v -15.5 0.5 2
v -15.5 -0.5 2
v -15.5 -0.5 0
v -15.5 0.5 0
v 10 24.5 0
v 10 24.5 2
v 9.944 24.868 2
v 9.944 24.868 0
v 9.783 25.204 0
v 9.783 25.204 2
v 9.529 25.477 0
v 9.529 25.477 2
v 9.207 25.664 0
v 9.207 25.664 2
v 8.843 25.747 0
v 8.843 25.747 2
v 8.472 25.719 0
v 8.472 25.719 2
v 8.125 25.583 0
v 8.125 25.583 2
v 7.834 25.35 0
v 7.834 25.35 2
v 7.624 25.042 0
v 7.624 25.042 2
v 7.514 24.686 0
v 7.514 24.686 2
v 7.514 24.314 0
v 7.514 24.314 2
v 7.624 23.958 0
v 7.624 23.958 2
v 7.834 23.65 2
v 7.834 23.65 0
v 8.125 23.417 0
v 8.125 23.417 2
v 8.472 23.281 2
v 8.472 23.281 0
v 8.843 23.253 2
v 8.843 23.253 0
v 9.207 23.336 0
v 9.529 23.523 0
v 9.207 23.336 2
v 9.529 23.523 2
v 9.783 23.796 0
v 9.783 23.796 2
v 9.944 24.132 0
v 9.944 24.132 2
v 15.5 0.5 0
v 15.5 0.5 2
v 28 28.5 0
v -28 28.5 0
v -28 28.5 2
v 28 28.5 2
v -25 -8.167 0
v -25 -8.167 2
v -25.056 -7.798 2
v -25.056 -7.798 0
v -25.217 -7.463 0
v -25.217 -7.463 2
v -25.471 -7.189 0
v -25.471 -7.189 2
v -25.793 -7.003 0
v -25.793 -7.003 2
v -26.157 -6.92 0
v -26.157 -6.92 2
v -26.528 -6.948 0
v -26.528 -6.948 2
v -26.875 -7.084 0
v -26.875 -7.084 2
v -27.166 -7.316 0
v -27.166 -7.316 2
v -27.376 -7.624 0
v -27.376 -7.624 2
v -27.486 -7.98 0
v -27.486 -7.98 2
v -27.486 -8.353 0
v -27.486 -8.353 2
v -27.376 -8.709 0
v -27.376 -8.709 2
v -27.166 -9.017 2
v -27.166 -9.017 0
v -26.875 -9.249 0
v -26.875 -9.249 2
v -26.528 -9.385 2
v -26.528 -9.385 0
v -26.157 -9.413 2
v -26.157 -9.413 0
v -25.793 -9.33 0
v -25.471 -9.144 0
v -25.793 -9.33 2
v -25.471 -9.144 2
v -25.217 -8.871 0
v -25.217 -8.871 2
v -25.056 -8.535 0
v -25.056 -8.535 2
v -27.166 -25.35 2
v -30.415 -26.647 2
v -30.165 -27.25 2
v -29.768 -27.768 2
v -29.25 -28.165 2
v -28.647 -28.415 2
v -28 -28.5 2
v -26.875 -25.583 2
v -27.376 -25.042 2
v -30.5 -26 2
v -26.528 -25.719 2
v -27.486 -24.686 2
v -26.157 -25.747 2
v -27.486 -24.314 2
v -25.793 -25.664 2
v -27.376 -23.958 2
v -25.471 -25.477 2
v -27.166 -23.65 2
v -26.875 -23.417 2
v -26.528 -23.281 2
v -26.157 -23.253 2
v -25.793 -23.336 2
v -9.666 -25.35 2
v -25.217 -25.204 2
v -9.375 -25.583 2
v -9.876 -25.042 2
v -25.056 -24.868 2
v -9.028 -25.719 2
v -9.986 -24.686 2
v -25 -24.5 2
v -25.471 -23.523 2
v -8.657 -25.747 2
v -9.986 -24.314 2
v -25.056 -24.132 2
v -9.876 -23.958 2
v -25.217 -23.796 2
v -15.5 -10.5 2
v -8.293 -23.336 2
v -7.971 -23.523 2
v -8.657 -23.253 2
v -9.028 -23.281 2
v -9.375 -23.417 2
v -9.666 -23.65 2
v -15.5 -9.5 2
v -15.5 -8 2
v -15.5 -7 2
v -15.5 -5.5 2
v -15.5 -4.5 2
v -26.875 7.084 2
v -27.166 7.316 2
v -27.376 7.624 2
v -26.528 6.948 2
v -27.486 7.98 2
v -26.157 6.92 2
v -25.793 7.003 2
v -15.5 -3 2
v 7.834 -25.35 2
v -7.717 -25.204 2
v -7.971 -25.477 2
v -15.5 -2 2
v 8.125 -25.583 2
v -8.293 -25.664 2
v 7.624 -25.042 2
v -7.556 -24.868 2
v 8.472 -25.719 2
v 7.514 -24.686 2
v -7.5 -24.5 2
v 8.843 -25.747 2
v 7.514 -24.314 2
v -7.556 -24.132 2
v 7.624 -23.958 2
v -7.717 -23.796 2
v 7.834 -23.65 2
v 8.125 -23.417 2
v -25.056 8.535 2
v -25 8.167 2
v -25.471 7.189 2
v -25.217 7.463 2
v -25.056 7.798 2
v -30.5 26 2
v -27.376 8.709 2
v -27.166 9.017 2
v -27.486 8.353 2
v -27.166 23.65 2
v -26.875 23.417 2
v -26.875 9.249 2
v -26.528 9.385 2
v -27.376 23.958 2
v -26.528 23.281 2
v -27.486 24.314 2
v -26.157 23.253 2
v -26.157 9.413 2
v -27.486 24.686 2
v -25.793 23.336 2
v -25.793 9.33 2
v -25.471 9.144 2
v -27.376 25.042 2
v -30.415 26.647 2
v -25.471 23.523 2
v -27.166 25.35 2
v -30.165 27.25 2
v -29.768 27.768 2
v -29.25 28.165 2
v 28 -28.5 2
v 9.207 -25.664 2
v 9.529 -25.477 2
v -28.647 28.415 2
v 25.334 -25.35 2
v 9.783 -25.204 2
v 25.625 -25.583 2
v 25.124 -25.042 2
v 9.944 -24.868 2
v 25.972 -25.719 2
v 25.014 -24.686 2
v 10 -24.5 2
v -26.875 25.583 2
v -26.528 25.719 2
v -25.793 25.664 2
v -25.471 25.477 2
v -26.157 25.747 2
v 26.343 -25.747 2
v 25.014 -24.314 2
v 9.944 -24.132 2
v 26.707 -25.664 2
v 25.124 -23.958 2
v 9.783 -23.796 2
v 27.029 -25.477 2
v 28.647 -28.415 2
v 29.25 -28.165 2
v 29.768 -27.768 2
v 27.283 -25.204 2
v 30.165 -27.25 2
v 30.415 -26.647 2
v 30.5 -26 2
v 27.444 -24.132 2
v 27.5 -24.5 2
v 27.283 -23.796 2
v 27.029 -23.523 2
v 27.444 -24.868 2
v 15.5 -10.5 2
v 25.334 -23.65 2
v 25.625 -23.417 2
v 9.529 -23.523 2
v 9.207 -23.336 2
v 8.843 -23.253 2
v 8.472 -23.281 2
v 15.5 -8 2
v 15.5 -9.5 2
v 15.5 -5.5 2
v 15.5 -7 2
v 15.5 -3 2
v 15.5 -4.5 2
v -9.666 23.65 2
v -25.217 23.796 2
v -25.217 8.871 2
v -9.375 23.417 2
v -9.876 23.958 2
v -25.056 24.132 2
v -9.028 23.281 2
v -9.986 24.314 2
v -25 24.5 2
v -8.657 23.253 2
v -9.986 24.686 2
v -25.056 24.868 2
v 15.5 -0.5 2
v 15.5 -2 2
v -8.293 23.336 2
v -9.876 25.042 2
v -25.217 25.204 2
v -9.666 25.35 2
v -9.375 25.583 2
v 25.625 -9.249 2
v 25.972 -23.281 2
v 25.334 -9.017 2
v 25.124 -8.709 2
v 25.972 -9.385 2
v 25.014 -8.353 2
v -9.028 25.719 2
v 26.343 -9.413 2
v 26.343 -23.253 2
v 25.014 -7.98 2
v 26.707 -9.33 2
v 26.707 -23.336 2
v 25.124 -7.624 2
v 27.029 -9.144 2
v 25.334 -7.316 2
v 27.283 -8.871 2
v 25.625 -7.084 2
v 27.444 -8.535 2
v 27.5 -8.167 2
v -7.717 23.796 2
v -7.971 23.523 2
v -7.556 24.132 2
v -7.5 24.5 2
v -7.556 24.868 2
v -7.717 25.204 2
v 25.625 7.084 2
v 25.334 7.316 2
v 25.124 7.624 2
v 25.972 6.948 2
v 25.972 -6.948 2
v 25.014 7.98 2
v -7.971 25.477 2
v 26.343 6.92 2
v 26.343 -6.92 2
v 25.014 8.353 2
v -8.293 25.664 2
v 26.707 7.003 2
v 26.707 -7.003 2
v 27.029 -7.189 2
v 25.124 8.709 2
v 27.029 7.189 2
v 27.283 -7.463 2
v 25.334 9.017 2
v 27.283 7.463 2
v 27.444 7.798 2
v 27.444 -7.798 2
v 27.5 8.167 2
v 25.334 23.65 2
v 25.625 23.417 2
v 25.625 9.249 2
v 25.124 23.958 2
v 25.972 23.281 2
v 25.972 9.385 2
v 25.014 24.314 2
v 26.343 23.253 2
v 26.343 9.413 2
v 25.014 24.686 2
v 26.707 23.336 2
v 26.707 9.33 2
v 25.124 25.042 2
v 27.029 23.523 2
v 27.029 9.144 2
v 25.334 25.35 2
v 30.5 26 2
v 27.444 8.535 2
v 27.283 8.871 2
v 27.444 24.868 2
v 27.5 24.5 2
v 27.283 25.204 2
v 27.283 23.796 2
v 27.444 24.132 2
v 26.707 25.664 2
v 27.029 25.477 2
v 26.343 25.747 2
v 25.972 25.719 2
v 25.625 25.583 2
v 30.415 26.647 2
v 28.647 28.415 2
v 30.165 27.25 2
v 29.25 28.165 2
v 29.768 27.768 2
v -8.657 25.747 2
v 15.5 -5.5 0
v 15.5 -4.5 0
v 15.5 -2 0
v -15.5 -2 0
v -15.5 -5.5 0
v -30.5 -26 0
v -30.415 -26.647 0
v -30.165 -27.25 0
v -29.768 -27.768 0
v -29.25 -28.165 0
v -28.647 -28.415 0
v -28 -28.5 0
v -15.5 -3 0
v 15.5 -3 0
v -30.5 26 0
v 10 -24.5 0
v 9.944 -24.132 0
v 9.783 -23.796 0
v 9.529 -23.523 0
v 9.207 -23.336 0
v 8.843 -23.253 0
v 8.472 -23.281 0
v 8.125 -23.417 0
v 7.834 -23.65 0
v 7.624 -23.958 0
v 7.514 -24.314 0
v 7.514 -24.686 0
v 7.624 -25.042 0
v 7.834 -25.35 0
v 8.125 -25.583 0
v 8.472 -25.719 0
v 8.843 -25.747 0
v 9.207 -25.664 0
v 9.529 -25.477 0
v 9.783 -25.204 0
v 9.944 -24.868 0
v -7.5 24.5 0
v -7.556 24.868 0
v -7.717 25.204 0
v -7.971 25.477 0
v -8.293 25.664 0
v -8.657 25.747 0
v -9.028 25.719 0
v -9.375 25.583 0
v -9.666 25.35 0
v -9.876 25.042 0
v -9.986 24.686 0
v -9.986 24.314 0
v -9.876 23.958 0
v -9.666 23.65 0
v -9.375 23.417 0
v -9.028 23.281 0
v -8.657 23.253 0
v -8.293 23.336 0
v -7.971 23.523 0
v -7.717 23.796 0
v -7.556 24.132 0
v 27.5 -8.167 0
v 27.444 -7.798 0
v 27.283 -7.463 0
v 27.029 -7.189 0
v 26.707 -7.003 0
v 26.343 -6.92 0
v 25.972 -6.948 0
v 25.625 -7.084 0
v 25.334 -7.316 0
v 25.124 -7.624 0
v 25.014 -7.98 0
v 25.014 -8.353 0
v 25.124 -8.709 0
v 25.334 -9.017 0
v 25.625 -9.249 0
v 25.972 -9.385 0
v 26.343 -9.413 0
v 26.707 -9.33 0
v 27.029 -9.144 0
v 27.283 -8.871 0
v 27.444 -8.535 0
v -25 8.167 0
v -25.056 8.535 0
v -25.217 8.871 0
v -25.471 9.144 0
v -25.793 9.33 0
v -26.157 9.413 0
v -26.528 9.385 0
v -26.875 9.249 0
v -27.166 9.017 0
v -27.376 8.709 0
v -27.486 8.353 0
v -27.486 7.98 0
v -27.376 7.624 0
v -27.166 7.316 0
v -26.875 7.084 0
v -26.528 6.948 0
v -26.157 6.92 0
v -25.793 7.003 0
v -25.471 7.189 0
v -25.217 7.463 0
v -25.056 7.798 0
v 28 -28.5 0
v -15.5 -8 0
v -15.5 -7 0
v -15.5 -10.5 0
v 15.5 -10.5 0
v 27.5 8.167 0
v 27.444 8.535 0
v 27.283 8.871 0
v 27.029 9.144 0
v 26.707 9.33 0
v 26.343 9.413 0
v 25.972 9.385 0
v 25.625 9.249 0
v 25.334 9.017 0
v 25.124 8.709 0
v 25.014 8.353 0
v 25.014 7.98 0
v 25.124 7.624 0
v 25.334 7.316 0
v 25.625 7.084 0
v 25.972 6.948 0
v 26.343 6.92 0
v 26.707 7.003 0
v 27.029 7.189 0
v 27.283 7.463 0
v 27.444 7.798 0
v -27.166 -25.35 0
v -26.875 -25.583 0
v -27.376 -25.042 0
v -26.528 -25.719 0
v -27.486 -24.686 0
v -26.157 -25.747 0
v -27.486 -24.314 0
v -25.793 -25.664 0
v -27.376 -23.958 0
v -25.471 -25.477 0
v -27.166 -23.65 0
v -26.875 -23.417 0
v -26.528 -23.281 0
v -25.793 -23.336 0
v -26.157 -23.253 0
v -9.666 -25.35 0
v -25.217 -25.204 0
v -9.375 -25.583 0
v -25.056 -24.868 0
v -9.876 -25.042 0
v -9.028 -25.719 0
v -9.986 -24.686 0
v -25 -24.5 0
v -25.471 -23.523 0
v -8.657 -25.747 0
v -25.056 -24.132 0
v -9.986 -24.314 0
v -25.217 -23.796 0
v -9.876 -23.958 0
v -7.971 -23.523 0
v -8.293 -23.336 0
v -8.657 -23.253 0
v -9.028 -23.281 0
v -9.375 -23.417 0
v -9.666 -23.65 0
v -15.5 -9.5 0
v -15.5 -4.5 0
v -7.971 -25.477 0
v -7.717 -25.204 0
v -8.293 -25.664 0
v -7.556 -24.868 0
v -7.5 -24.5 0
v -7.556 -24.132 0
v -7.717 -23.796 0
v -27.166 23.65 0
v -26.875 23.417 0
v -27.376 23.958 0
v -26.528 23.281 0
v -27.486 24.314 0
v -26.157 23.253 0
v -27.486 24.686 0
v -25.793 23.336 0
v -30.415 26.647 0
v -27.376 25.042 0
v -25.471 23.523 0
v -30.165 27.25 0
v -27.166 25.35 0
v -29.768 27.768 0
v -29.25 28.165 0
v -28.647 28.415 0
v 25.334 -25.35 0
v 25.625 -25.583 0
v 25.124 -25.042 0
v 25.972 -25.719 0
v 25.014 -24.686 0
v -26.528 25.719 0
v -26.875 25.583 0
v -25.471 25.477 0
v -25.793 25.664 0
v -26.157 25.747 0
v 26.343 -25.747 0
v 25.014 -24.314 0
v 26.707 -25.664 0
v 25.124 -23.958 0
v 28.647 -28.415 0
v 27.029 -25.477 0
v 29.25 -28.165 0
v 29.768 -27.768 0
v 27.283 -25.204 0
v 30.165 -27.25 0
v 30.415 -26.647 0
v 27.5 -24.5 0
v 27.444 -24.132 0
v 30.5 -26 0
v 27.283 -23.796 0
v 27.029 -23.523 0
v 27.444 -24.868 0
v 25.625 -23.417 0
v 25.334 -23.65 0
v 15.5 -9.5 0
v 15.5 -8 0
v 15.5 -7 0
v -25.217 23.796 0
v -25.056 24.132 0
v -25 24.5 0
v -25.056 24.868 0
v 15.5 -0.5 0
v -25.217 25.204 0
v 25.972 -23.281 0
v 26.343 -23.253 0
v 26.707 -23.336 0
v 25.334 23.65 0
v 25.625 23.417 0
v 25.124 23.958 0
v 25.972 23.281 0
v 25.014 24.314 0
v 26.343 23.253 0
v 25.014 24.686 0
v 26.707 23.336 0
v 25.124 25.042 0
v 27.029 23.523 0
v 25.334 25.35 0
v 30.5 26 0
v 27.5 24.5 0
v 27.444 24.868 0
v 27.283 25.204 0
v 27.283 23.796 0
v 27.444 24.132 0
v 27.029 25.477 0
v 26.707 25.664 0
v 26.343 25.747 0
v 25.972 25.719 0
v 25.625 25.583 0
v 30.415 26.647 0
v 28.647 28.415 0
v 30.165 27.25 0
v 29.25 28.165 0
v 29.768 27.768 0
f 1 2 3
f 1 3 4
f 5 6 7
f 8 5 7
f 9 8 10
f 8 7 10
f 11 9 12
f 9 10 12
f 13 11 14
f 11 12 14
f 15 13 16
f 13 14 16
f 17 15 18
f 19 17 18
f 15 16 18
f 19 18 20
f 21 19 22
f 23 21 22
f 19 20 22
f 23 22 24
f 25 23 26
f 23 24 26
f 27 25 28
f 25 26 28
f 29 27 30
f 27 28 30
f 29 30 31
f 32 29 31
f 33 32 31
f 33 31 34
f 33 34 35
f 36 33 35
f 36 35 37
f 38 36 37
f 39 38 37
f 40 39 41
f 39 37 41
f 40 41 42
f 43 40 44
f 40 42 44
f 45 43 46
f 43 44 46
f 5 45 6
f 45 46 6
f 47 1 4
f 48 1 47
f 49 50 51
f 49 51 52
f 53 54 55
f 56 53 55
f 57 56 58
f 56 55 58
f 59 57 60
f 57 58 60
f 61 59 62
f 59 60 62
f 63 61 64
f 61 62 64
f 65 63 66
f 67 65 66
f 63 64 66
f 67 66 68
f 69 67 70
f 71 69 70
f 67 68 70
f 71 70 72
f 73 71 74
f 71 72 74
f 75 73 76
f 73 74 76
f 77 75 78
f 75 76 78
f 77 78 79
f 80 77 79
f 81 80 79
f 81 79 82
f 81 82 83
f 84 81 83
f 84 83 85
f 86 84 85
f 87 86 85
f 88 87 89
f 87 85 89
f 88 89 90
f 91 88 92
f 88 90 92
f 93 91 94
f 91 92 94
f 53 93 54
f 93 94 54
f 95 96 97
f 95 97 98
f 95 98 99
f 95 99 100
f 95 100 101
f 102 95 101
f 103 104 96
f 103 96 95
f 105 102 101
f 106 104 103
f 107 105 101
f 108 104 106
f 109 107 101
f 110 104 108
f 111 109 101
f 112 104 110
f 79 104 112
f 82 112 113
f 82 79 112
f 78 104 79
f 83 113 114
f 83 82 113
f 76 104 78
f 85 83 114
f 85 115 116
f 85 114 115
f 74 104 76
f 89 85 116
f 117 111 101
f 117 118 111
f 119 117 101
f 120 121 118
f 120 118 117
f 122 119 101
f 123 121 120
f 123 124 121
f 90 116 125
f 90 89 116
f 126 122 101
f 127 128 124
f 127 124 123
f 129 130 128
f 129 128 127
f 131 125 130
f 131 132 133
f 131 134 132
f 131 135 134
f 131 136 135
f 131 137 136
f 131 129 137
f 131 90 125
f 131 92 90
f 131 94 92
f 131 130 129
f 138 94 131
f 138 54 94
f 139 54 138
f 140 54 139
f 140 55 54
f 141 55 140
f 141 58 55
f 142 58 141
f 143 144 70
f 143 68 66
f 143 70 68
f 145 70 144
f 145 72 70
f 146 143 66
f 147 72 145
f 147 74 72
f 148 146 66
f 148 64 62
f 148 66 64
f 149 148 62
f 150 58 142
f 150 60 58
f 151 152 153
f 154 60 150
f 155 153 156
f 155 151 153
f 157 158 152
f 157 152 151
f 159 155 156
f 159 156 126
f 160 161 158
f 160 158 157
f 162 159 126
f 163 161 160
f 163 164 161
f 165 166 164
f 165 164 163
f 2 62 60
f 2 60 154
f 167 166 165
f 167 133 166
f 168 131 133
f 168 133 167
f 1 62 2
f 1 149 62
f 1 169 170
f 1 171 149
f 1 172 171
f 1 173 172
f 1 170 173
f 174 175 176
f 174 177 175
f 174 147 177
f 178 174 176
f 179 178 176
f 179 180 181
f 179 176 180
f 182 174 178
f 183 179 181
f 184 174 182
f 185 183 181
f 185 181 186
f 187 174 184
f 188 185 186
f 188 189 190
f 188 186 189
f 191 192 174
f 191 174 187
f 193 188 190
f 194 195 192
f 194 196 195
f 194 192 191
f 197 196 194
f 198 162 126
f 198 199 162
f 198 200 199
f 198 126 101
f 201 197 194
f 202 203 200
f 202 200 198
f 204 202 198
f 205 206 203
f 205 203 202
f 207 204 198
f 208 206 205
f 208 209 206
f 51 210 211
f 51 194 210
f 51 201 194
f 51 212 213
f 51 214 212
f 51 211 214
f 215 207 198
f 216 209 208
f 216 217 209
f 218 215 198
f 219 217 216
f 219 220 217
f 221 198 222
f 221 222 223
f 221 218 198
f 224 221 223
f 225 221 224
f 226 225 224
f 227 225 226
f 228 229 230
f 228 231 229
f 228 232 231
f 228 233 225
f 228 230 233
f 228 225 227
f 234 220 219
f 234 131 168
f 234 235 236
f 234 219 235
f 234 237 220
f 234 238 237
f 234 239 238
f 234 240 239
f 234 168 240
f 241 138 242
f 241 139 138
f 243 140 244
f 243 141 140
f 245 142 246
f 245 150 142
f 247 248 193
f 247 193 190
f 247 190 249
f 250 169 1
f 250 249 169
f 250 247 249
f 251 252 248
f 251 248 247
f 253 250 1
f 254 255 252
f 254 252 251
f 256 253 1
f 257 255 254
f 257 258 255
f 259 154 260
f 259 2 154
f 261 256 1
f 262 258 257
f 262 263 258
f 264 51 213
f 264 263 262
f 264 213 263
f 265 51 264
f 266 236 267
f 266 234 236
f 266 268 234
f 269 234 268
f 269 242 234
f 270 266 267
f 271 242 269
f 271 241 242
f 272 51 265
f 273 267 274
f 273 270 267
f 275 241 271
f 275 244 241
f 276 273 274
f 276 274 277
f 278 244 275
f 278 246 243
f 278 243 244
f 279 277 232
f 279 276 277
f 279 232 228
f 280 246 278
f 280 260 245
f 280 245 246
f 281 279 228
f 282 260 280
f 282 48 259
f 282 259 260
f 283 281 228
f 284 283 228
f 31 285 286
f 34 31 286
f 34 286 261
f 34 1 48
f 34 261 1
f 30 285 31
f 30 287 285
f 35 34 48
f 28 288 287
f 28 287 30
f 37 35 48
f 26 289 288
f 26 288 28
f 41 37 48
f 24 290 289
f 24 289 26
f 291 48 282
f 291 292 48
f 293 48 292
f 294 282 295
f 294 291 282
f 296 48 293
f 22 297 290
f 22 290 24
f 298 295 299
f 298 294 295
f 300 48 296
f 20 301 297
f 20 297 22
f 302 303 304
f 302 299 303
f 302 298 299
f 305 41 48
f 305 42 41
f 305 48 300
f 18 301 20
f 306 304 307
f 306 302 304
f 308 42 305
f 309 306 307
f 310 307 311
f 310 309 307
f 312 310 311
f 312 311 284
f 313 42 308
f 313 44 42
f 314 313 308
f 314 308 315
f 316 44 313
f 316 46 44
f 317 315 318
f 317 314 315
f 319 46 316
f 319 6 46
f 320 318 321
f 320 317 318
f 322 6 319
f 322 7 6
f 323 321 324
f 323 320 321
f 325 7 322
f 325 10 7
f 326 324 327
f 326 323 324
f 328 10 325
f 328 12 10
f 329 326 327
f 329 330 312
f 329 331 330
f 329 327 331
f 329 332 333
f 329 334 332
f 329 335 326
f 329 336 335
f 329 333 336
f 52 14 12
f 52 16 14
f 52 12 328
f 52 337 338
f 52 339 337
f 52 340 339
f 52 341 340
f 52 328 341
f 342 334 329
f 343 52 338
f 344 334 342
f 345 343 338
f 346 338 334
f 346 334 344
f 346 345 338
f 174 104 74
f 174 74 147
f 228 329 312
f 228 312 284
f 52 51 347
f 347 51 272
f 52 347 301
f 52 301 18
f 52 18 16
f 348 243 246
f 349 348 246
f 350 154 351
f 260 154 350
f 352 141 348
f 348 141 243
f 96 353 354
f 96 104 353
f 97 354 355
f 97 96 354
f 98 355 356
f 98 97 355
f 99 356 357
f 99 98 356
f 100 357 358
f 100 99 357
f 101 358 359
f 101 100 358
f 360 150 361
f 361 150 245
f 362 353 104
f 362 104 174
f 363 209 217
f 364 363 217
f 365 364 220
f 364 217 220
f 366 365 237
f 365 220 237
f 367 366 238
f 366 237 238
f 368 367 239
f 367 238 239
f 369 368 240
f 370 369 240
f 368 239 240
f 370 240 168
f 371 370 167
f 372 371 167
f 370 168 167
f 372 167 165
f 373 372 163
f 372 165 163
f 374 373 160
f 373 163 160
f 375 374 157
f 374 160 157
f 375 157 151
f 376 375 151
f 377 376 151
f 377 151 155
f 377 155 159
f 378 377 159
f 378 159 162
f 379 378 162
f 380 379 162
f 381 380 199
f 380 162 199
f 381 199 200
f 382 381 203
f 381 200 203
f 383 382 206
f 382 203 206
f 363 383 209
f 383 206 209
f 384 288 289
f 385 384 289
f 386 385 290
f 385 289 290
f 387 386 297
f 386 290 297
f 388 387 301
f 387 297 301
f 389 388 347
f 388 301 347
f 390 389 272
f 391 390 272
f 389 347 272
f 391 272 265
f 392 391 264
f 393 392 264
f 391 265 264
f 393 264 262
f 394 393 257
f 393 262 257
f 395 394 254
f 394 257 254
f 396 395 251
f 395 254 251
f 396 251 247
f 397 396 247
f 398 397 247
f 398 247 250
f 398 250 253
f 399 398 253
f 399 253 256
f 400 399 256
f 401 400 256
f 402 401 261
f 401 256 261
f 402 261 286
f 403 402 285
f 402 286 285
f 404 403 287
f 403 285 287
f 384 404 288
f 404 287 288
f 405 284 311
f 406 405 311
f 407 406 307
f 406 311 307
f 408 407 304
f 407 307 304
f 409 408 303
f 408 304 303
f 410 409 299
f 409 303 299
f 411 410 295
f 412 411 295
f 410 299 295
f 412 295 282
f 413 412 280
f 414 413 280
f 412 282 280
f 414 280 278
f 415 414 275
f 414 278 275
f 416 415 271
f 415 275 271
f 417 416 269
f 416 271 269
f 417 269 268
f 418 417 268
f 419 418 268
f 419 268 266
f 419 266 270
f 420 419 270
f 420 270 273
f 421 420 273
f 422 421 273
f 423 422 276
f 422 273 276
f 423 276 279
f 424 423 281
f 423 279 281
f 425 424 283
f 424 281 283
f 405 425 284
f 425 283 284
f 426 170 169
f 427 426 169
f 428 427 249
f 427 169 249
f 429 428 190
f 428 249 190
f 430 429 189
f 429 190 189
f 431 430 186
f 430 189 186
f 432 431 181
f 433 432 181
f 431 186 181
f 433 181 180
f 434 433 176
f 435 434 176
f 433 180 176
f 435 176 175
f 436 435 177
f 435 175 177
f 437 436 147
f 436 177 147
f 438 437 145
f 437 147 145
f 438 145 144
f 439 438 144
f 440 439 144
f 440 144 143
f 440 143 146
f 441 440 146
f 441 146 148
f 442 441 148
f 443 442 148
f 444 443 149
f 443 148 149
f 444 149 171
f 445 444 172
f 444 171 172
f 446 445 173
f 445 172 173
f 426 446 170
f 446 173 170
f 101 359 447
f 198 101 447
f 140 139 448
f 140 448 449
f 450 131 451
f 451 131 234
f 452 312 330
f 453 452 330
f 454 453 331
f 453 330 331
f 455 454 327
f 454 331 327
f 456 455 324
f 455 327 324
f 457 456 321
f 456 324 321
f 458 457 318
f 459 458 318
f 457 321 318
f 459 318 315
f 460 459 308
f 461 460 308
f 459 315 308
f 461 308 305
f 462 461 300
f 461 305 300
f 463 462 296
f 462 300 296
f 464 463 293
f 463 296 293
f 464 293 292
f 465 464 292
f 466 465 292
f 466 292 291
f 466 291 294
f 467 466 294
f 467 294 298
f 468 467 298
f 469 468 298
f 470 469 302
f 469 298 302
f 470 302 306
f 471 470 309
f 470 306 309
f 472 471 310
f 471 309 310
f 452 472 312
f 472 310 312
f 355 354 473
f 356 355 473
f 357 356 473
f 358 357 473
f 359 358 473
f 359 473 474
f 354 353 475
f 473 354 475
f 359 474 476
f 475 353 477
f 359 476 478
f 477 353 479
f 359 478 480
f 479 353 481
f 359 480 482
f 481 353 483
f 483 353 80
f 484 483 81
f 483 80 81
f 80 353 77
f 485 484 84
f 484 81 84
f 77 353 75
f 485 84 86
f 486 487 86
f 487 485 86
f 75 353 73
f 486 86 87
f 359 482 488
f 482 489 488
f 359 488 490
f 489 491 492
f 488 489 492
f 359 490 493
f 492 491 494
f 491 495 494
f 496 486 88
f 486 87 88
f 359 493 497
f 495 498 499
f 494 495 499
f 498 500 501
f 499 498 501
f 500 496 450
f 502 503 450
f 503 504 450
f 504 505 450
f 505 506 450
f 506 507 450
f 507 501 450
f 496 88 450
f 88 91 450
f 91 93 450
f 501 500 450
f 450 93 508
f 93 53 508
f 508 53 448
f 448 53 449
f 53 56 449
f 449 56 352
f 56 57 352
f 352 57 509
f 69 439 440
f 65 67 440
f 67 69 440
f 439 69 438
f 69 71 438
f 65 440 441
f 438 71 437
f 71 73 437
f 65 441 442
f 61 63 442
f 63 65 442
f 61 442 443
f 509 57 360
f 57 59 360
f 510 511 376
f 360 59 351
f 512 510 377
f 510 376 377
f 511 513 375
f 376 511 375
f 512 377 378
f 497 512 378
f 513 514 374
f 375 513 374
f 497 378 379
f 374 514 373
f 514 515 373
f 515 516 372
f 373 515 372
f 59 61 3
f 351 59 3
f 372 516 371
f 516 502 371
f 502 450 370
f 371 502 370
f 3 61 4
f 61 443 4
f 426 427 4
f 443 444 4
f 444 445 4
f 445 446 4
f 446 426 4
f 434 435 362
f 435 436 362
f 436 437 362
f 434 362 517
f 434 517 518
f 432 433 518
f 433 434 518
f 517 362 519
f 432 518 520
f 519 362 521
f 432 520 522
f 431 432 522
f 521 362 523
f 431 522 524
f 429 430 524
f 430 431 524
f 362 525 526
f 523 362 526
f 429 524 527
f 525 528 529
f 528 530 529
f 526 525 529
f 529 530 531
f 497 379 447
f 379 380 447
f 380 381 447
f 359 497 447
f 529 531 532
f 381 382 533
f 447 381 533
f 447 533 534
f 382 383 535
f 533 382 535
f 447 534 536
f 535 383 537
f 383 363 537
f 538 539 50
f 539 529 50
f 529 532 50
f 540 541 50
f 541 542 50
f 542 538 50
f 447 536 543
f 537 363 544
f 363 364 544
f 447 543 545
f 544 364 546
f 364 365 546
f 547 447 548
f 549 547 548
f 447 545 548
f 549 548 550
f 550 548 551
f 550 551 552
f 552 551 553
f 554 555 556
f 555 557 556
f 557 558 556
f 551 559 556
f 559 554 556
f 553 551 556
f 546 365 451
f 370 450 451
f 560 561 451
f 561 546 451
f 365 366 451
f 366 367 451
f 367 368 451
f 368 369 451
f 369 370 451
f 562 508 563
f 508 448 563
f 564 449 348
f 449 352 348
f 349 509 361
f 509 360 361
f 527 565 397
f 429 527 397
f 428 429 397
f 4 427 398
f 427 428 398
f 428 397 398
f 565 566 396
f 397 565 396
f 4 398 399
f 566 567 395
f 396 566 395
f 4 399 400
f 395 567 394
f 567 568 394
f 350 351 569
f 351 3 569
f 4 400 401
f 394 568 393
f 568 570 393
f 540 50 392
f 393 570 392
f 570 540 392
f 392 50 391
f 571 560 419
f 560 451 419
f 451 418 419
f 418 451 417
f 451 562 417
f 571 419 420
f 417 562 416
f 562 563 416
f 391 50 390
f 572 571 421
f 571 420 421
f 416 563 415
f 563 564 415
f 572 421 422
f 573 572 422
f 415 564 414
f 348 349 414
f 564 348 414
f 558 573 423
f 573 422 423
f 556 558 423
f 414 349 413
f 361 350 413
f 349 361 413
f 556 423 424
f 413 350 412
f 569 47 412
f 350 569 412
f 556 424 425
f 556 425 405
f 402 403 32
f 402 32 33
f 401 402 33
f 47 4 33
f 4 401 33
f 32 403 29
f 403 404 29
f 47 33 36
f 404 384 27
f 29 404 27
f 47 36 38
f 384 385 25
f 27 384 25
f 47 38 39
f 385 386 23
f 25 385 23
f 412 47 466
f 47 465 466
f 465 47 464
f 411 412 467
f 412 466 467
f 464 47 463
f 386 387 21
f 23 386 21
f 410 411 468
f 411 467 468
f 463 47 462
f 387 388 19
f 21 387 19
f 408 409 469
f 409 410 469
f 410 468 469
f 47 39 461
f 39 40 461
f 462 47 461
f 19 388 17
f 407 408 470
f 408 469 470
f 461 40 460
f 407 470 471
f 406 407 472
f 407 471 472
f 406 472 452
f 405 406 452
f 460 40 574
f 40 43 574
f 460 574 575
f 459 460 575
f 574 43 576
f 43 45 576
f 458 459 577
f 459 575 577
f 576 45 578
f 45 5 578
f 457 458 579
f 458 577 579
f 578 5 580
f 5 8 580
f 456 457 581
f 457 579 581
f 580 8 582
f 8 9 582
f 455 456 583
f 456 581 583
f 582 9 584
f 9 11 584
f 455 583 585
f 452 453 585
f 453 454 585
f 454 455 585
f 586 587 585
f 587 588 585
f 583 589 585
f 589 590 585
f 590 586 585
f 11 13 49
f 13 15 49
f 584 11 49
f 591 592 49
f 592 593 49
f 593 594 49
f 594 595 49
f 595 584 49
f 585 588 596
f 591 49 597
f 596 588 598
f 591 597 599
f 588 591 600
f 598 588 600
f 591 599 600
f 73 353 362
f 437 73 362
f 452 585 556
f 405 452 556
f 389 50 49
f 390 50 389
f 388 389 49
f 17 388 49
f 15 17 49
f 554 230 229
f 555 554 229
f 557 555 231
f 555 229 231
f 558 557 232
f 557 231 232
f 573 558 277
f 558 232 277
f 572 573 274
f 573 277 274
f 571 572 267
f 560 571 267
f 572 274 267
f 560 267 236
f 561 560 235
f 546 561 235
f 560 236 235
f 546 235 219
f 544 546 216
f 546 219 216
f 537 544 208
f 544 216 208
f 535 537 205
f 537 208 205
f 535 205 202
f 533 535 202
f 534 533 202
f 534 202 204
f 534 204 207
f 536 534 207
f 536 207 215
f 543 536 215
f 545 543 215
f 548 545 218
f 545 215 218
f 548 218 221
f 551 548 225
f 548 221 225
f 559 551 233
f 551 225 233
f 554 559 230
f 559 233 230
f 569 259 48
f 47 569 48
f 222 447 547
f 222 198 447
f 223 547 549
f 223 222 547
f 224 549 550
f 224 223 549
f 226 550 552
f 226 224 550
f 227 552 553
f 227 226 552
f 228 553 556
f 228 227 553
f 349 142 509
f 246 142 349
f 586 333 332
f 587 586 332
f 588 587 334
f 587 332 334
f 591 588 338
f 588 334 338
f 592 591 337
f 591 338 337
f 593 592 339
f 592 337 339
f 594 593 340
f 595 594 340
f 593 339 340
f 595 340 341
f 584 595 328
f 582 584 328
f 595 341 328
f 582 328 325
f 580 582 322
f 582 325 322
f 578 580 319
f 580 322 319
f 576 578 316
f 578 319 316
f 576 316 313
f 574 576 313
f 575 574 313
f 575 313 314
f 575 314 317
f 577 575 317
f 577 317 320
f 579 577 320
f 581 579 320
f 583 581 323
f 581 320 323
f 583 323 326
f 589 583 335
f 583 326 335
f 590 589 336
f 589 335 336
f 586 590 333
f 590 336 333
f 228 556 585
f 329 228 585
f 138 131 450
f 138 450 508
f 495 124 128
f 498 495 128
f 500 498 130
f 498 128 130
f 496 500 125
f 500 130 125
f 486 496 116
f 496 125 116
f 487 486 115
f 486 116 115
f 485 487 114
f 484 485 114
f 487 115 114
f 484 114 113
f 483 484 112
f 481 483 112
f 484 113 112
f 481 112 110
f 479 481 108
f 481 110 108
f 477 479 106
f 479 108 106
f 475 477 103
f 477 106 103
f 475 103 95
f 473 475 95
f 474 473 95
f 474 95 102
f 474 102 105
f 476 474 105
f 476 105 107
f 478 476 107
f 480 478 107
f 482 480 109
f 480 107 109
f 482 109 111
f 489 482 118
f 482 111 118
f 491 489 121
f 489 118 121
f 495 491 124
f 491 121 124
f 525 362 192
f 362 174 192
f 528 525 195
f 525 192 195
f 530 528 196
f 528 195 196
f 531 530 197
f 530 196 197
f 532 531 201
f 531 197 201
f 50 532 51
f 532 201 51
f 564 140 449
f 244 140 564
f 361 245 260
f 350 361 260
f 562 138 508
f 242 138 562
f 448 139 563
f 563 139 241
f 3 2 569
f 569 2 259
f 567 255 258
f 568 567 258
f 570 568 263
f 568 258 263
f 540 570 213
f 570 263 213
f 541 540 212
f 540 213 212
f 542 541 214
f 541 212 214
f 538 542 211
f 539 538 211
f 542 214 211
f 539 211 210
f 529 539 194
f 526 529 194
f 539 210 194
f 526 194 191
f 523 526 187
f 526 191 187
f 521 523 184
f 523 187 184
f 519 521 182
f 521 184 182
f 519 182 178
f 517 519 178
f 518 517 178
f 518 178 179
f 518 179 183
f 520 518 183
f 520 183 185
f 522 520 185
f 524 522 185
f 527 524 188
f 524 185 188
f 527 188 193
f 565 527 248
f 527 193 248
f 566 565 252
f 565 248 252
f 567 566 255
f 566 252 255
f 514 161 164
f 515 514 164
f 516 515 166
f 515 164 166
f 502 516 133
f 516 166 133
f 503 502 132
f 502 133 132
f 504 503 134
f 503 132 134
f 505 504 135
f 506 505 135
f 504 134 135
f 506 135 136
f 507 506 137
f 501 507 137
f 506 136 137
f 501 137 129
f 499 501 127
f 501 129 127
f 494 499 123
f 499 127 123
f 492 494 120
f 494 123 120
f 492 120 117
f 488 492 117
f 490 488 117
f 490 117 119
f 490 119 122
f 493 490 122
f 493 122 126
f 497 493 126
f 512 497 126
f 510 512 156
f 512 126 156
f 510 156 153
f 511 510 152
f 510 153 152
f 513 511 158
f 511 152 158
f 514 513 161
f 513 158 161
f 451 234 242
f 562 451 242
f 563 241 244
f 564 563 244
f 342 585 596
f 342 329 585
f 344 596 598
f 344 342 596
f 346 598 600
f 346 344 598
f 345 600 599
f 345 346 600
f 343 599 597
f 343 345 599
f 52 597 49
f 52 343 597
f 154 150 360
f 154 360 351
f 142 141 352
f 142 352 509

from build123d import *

# Parameters (mm, degrees)
SKETCH1_W           = 61
SKETCH1_H           = 57
BOSS_EXTRUDE1_DEPTH = 2
FILLET1_R           = 2.5
SKETCH2_R           = 1.25
CUT_EXTRUDE1_DEPTH  = 2
SKETCH3_W           = 31
SKETCH3_H           = 1
CUT_EXTRUDE2_DEPTH  = 2


with BuildPart() as part:
    # Sketch1 → Boss-Extrude1 (new body)
    with BuildSketch(Plane.XY):
        Rectangle(SKETCH1_W, SKETCH1_H)
    extrude(amount=BOSS_EXTRUDE1_DEPTH)

    # Fillet1
    fillet1_edges = [part.edges().sort_by_distance(p)[0] for p in [
        (30.5, -28.5, 1),
        (-30.5, -28.5, 1),
        (-30.5, 28.5, 1),
        (30.5, 28.5, 1),
    ]]
    fillet(fillet1_edges, radius=FILLET1_R)

    # Sketch2 → Cut-Extrude1 (cut)
    with BuildSketch(Plane.XY.offset(2)):
        with Locations((-26.25, 24.5)):
            Circle(SKETCH2_R)
        with Locations((-8.75, 24.5)):
            Circle(SKETCH2_R)
        with Locations((8.75, 24.5)):
            Circle(SKETCH2_R)
        with Locations((26.25, 24.5)):
            Circle(SKETCH2_R)
        with Locations((26.25, 8.166666667)):
            Circle(SKETCH2_R)
        with Locations((26.25, -8.166666667)):
            Circle(SKETCH2_R)
        with Locations((-8.75, -24.5)):
            Circle(SKETCH2_R)
        with Locations((8.75, -24.5)):
            Circle(SKETCH2_R)
        with Locations((26.25, -24.5)):
            Circle(SKETCH2_R)
        with Locations((-26.25, 8.166666667)):
            Circle(SKETCH2_R)
        with Locations((-26.25, -8.166666667)):
            Circle(SKETCH2_R)
        with Locations((-26.25, -24.5)):
            Circle(SKETCH2_R)
    extrude(amount=-CUT_EXTRUDE1_DEPTH, mode=Mode.SUBTRACT)

    # Sketch3 → Cut-Extrude2 (cut)
    with BuildSketch(Plane.XY.offset(2)):
        Rectangle(SKETCH3_W, SKETCH3_H)
        with Locations((0, -2.5)):
            Rectangle(SKETCH3_W, SKETCH3_H)
        with Locations((0, -5)):
            Rectangle(SKETCH3_W, SKETCH3_H)
        with Locations((0, -7.5)):
            Rectangle(SKETCH3_W, SKETCH3_H)
        with Locations((0, -10)):
            Rectangle(SKETCH3_W, SKETCH3_H)
    extrude(amount=-CUT_EXTRUDE2_DEPTH, mode=Mode.SUBTRACT)


solid = part.part
